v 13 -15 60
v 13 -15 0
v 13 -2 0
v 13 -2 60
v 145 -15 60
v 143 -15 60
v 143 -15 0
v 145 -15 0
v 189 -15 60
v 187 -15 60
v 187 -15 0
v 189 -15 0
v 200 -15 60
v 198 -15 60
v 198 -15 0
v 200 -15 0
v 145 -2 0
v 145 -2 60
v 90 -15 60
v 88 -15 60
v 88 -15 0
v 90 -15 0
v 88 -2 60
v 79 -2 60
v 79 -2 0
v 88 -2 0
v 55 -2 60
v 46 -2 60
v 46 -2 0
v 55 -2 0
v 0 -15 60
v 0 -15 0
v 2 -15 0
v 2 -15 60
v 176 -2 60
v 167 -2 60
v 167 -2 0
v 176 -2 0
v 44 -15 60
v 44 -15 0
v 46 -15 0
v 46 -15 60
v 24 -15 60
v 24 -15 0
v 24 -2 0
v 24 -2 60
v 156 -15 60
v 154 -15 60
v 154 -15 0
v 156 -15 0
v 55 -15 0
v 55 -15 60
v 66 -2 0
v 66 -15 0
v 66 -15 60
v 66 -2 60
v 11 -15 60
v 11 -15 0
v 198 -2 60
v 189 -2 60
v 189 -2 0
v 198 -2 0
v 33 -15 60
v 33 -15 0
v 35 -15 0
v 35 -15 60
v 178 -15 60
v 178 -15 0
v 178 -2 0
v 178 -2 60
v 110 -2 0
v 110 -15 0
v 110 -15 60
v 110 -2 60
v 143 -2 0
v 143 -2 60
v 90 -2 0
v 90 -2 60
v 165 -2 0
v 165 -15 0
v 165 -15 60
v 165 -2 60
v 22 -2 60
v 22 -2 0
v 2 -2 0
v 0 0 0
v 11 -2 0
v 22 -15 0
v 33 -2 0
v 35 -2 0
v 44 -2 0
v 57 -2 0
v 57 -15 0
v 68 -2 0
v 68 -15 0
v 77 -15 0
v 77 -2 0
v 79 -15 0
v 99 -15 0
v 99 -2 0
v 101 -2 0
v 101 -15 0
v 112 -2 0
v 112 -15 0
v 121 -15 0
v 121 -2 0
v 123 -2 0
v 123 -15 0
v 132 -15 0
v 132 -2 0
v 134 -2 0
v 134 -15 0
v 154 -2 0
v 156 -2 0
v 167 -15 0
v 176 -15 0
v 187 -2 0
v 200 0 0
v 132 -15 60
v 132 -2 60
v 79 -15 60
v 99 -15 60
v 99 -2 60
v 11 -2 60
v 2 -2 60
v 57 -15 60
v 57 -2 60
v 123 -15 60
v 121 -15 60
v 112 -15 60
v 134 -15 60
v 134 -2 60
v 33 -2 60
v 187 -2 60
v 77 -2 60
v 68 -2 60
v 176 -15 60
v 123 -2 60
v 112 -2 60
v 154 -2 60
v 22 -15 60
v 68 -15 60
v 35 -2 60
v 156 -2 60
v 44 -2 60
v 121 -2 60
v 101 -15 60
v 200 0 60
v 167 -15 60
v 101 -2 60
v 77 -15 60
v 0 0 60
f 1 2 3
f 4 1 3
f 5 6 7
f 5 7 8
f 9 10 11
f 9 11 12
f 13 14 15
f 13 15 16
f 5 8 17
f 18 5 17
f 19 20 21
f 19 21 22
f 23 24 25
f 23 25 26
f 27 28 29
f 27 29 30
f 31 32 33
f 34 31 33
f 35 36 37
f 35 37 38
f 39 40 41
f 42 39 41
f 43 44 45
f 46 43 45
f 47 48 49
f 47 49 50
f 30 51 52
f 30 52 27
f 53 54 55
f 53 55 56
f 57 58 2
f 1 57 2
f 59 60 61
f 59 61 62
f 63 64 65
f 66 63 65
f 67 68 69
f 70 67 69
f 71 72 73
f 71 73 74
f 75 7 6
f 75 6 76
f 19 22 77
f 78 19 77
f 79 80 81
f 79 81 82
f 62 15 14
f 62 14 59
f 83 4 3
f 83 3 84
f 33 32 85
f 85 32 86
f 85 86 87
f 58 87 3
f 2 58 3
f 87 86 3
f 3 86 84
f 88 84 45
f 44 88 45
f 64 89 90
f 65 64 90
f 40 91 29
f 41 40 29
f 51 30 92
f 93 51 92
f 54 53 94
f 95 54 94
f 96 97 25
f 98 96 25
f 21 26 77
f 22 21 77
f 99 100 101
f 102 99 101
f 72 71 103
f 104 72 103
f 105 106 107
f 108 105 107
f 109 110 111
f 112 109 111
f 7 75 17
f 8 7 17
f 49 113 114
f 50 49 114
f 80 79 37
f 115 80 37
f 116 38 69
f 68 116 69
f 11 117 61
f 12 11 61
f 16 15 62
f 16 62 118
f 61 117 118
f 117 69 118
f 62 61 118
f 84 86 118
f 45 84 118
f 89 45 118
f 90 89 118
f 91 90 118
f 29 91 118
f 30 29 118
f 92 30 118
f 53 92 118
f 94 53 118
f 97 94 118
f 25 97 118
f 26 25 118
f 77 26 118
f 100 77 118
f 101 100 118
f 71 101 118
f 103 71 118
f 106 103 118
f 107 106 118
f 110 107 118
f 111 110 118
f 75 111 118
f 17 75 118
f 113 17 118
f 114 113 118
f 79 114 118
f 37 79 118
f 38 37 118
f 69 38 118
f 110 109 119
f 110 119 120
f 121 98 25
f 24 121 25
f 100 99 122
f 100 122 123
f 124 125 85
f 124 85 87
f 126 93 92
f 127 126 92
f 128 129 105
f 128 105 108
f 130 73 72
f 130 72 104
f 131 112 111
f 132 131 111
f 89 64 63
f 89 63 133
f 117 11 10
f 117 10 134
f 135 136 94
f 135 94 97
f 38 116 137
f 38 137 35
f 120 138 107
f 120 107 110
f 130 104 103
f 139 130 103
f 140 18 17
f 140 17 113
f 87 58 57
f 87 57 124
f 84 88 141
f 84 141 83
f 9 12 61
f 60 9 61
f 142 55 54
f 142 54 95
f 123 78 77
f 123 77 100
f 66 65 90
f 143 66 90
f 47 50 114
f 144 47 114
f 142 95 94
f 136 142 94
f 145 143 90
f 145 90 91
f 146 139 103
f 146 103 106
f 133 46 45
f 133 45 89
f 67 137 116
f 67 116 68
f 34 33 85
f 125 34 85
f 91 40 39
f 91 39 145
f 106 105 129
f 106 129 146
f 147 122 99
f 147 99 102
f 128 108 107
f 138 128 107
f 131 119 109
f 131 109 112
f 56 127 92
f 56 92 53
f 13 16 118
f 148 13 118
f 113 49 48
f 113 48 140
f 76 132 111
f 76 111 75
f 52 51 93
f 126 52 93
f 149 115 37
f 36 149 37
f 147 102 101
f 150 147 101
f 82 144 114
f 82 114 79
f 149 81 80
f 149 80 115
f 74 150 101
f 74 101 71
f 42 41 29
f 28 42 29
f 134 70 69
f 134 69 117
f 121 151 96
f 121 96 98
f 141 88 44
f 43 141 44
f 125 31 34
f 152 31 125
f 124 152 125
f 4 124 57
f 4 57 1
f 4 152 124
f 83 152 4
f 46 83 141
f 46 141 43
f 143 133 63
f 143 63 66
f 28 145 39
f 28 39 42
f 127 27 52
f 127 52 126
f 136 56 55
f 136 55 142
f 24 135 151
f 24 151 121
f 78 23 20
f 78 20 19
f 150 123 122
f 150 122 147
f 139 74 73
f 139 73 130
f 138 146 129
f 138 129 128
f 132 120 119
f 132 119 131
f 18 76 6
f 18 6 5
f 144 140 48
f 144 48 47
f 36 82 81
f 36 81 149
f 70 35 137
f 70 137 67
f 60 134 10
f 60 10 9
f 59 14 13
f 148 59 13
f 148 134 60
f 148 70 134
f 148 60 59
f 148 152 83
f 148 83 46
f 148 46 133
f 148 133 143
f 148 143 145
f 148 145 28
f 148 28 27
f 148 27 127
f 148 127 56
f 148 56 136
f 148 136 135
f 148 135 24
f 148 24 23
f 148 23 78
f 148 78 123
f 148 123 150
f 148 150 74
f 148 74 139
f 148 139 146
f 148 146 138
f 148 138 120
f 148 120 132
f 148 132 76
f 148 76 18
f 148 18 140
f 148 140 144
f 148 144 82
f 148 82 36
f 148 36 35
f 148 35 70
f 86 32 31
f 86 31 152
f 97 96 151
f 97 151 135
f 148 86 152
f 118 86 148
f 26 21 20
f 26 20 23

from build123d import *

# Parameters (mm, degrees)
BOX035_W     = 9
BOX035_H     = 13
BOX035_DEPTH = 60
BOX023_W     = 9
BOX023_H     = 13
BOX023_DEPTH = 60
BOX024_W     = 9
BOX024_H     = 13
BOX024_DEPTH = 60
BOX025_W     = 9
BOX025_H     = 13
BOX025_DEPTH = 60
BOX026_W     = 9
BOX026_H     = 13
BOX026_DEPTH = 60
BOX027_W     = 9
BOX027_H     = 13
BOX027_DEPTH = 60
BOX028_W     = 9
BOX028_H     = 13
BOX028_DEPTH = 60
BOX029_W     = 9
BOX029_H     = 13
BOX029_DEPTH = 60
BOX030_W     = 9
BOX030_H     = 13
BOX030_DEPTH = 60
BOX031_W     = 9
BOX031_H     = 13
BOX031_DEPTH = 60
BOX032_W     = 9
BOX032_H     = 13
BOX032_DEPTH = 60
BOX033_W     = 9
BOX033_H     = 13
BOX033_DEPTH = 60
BOX034_W     = 9
BOX034_H     = 13
BOX034_DEPTH = 60
BOX036_W     = 9
BOX036_H     = 13
BOX036_DEPTH = 60
BOX037_W     = 9
BOX037_H     = 13
BOX037_DEPTH = 60
BOX038_W     = 9
BOX038_H     = 13
BOX038_DEPTH = 60
BOX039_W     = 9
BOX039_H     = 13
BOX039_DEPTH = 60
BOX022_W     = 9
BOX022_H     = 13
BOX022_DEPTH = 60
BOX021_W     = 200
BOX021_H     = 15
BOX021_DEPTH = 60


with BuildPart() as cube035:
    # Box035 → Box035 (new body)
    with BuildSketch(Plane(origin=(145, -15, 0), x_dir=(1, 0, 0), z_dir=(0, 0, 1))):
        with Locations((4.5, 6.5)):
            Rectangle(BOX035_W, BOX035_H)
    extrude(amount=BOX035_DEPTH)


with BuildPart() as cube023:
    # Box023 → Box023 (new body)
    with BuildSketch(Plane(origin=(13, -15, 0), x_dir=(1, 0, 0), z_dir=(0, 0, 1))):
        with Locations((4.5, 6.5)):
            Rectangle(BOX023_W, BOX023_H)
    extrude(amount=BOX023_DEPTH)


with BuildPart() as cube024:
    # Box024 → Box024 (new body)
    with BuildSketch(Plane(origin=(24, -15, 0), x_dir=(1, 0, 0), z_dir=(0, 0, 1))):
        with Locations((4.5, 6.5)):
            Rectangle(BOX024_W, BOX024_H)
    extrude(amount=BOX024_DEPTH)


with BuildPart() as cube025:
    # Box025 → Box025 (new body)
    with BuildSketch(Plane(origin=(35, -15, 0), x_dir=(1, 0, 0), z_dir=(0, 0, 1))):
        with Locations((4.5, 6.5)):
            Rectangle(BOX025_W, BOX025_H)
    extrude(amount=BOX025_DEPTH)


with BuildPart() as cube026:
    # Box026 → Box026 (new body)
    with BuildSketch(Plane(origin=(46, -15, 0), x_dir=(1, 0, 0), z_dir=(0, 0, 1))):
        with Locations((4.5, 6.5)):
            Rectangle(BOX026_W, BOX026_H)
    extrude(amount=BOX026_DEPTH)


with BuildPart() as cube027:
    # Box027 → Box027 (new body)
    with BuildSketch(Plane(origin=(57, -15, 0), x_dir=(1, 0, 0), z_dir=(0, 0, 1))):
        with Locations((4.5, 6.5)):
            Rectangle(BOX027_W, BOX027_H)
    extrude(amount=BOX027_DEPTH)


with BuildPart() as cube028:
    # Box028 → Box028 (new body)
    with BuildSketch(Plane(origin=(68, -15, 0), x_dir=(1, 0, 0), z_dir=(0, 0, 1))):
        with Locations((4.5, 6.5)):
            Rectangle(BOX028_W, BOX028_H)
    extrude(amount=BOX028_DEPTH)


with BuildPart() as cube029:
    # Box029 → Box029 (new body)
    with BuildSketch(Plane(origin=(79, -15, 0), x_dir=(1, 0, 0), z_dir=(0, 0, 1))):
        with Locations((4.5, 6.5)):
            Rectangle(BOX029_W, BOX029_H)
    extrude(amount=BOX029_DEPTH)


with BuildPart() as cube030:
    # Box030 → Box030 (new body)
    with BuildSketch(Plane(origin=(90, -15, 0), x_dir=(1, 0, 0), z_dir=(0, 0, 1))):
        with Locations((4.5, 6.5)):
            Rectangle(BOX030_W, BOX030_H)
    extrude(amount=BOX030_DEPTH)


with BuildPart() as cube031:
    # Box031 → Box031 (new body)
    with BuildSketch(Plane(origin=(101, -15, 0), x_dir=(1, 0, 0), z_dir=(0, 0, 1))):
        with Locations((4.5, 6.5)):
            Rectangle(BOX031_W, BOX031_H)
    extrude(amount=BOX031_DEPTH)


with BuildPart() as cube032:
    # Box032 → Box032 (new body)
    with BuildSketch(Plane(origin=(112, -15, 0), x_dir=(1, 0, 0), z_dir=(0, 0, 1))):
        with Locations((4.5, 6.5)):
            Rectangle(BOX032_W, BOX032_H)
    extrude(amount=BOX032_DEPTH)


with BuildPart() as cube033:
    # Box033 → Box033 (new body)
    with BuildSketch(Plane(origin=(123, -15, 0), x_dir=(1, 0, 0), z_dir=(0, 0, 1))):
        with Locations((4.5, 6.5)):
            Rectangle(BOX033_W, BOX033_H)
    extrude(amount=BOX033_DEPTH)


with BuildPart() as cube034:
    # Box034 → Box034 (new body)
    with BuildSketch(Plane(origin=(134, -15, 0), x_dir=(1, 0, 0), z_dir=(0, 0, 1))):
        with Locations((4.5, 6.5)):
            Rectangle(BOX034_W, BOX034_H)
    extrude(amount=BOX034_DEPTH)


with BuildPart() as cube036:
    # Box036 → Box036 (new body)
    with BuildSketch(Plane(origin=(156, -15, 0), x_dir=(1, 0, 0), z_dir=(0, 0, 1))):
        with Locations((4.5, 6.5)):
            Rectangle(BOX036_W, BOX036_H)
    extrude(amount=BOX036_DEPTH)


with BuildPart() as cube037:
    # Box037 → Box037 (new body)
    with BuildSketch(Plane(origin=(167, -15, 0), x_dir=(1, 0, 0), z_dir=(0, 0, 1))):
        with Locations((4.5, 6.5)):
            Rectangle(BOX037_W, BOX037_H)
    extrude(amount=BOX037_DEPTH)


with BuildPart() as cube038:
    # Box038 → Box038 (new body)
    with BuildSketch(Plane(origin=(178, -15, 0), x_dir=(1, 0, 0), z_dir=(0, 0, 1))):
        with Locations((4.5, 6.5)):
            Rectangle(BOX038_W, BOX038_H)
    extrude(amount=BOX038_DEPTH)


with BuildPart() as cube039:
    # Box039 → Box039 (new body)
    with BuildSketch(Plane(origin=(189, -15, 0), x_dir=(1, 0, 0), z_dir=(0, 0, 1))):
        with Locations((4.5, 6.5)):
            Rectangle(BOX039_W, BOX039_H)
    extrude(amount=BOX039_DEPTH)


with BuildPart() as compound001:
    # Box022 → Box022 (new body)
    with BuildSketch(Plane(origin=(2, -15, 0), x_dir=(1, 0, 0), z_dir=(0, 0, 1))):
        with Locations((4.5, 6.5)):
            Rectangle(BOX022_W, BOX022_H)
    extrude(amount=BOX022_DEPTH)

    # Compound001: union Cube035, Cube023, Cube024, Cube025, Cube026, Cube027, Cube028, Cube029, Cube030, Cube031, Cube032, Cube033, Cube034, Cube036, Cube037, Cube038, Cube039
    add(cube035.part)
    add(cube023.part)
    add(cube024.part)
    add(cube025.part)
    add(cube026.part)
    add(cube027.part)
    add(cube028.part)
    add(cube029.part)
    add(cube030.part)
    add(cube031.part)
    add(cube032.part)
    add(cube033.part)
    add(cube034.part)
    add(cube036.part)
    add(cube037.part)
    add(cube038.part)
    add(cube039.part)


with BuildPart() as cut002:
    # Box021 → Box021 (new body)
    with BuildSketch(Plane(origin=(0, -15, 0), x_dir=(1, 0, 0), z_dir=(0, 0, 1))):
        with Locations((100, 7.5)):
            Rectangle(BOX021_W, BOX021_H)
    extrude(amount=BOX021_DEPTH)

    # Cut002: cut Compound001
    add(compound001.part, mode=Mode.SUBTRACT)


solid = cut002.part
